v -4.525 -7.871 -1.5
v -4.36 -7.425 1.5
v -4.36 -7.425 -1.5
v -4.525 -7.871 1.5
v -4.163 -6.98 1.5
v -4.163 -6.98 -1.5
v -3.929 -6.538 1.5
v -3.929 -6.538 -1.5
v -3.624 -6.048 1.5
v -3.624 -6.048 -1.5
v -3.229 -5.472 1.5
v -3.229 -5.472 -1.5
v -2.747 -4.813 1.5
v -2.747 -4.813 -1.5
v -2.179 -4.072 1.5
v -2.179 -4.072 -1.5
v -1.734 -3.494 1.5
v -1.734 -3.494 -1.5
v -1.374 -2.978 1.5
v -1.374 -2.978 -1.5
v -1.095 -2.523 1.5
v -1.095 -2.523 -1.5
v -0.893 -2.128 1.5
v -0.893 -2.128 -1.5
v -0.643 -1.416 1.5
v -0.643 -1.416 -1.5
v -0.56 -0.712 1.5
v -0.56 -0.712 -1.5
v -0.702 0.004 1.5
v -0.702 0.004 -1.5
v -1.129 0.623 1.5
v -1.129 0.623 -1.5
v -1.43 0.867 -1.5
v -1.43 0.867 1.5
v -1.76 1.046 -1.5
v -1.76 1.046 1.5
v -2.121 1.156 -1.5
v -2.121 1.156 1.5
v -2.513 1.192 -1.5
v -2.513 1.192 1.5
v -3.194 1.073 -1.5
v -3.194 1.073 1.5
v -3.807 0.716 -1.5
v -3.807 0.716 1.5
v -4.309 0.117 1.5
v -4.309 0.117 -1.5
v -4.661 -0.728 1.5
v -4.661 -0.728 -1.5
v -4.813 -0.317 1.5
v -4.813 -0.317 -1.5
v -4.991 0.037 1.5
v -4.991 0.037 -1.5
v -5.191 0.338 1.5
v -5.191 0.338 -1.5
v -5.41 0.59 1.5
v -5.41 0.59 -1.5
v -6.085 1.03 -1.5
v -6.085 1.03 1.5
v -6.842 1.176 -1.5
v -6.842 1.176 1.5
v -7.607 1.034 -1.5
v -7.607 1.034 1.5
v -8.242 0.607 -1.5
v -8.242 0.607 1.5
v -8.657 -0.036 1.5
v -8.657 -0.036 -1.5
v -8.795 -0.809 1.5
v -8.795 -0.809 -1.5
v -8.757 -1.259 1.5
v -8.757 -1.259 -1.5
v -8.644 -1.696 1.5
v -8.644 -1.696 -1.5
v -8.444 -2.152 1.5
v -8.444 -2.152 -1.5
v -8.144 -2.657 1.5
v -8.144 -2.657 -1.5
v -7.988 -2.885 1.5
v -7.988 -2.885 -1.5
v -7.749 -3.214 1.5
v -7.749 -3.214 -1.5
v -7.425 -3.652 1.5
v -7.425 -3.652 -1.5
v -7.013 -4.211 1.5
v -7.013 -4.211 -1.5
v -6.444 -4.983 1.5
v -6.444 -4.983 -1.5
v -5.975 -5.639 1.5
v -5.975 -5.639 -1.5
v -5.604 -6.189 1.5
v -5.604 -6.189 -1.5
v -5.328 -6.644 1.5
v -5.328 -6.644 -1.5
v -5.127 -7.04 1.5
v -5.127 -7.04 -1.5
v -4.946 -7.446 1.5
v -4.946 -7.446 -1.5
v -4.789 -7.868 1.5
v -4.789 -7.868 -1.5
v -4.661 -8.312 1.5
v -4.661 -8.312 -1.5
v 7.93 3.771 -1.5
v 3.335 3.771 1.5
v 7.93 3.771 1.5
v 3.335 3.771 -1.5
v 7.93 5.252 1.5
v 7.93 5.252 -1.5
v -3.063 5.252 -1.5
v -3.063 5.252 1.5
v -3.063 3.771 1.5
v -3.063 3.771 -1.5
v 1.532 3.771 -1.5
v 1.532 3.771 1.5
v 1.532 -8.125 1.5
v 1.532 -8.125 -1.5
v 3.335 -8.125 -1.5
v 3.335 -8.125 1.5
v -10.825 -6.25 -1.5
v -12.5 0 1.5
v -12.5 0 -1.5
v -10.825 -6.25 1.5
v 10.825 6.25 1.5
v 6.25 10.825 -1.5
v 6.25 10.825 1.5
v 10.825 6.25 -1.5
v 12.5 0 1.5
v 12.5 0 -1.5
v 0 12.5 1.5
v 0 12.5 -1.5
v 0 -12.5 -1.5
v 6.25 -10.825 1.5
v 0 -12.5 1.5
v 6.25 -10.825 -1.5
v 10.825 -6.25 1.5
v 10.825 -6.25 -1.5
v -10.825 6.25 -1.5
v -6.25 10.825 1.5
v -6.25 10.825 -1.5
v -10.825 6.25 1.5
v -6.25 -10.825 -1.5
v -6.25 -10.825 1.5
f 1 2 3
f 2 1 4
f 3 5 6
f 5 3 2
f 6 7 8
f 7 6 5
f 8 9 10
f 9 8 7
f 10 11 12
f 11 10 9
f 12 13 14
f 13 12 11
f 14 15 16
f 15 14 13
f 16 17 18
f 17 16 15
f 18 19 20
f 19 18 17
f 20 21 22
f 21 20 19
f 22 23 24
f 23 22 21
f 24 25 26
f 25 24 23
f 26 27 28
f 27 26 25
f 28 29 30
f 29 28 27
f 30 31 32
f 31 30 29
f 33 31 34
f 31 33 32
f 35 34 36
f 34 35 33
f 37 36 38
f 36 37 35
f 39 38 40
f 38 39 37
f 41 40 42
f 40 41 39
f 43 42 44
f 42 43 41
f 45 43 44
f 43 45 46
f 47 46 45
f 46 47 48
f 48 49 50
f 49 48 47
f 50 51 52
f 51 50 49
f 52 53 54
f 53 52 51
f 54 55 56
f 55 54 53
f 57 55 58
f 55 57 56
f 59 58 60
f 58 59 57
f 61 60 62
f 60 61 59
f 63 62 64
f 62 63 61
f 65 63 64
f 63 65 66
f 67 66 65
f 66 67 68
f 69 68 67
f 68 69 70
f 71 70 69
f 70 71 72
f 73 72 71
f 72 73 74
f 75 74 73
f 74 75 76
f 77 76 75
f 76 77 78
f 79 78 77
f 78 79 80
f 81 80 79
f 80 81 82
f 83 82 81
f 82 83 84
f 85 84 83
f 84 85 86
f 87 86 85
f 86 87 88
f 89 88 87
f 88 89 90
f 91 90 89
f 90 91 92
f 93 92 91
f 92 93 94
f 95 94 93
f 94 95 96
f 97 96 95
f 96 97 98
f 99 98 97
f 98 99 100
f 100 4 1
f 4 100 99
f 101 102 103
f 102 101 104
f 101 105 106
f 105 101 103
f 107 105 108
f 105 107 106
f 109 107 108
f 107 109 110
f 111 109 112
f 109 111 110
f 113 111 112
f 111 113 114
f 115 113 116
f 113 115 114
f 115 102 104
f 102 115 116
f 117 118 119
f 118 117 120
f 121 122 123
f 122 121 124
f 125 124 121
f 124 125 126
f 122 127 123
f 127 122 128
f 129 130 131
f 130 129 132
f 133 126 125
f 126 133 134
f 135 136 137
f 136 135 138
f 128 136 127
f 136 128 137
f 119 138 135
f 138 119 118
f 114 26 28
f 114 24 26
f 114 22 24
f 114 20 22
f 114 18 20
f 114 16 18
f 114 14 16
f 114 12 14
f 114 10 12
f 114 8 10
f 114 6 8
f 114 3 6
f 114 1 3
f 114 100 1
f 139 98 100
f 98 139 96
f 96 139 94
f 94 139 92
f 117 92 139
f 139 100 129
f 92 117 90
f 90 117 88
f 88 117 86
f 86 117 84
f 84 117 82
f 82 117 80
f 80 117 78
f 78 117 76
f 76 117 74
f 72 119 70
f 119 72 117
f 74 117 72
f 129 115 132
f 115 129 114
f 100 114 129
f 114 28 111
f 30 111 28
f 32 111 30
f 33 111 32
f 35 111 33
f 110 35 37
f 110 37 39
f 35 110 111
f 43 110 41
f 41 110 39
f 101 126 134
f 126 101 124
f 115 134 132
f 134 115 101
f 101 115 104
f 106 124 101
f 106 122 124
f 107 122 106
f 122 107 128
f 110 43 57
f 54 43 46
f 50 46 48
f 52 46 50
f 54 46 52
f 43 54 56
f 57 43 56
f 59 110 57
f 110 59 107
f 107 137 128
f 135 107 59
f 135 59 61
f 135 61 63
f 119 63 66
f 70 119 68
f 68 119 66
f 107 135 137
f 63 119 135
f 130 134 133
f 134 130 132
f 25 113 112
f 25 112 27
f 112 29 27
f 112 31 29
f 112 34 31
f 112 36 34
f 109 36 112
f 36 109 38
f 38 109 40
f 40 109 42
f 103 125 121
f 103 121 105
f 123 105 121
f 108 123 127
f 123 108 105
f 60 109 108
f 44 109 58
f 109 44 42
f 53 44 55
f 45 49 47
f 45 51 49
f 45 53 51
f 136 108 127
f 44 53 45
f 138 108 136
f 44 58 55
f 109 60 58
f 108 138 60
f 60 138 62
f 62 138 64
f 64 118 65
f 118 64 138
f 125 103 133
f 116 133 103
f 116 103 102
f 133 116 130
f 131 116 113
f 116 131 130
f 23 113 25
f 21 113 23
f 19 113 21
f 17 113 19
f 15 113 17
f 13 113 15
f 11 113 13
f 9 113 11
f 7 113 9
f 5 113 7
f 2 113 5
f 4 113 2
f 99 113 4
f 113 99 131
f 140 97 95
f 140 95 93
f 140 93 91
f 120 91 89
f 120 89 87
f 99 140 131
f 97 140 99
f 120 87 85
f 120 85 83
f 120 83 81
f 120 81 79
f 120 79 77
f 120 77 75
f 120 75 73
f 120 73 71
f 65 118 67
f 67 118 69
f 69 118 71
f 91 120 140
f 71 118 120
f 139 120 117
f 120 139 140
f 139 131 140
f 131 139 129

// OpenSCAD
$fn=12;

// unit is mm

diameter = 25;
thickness = 3;
slit_width = 0.8;
arrow_base = 7;

diameter_2 = diameter / 2;


difference() {

  union() {
    cylinder(d=diameter, h=thickness, center=true);
  }

  union() {

    translate([ -0.77 * diameter_2, -0.65 * diameter_2, -thickness ])
      linear_extrude(2 * thickness)
      text("\u2665", size=12);
    translate([ -0.28 * diameter_2, -0.65 * diameter_2, -thickness ])
      linear_extrude(2 * thickness)
      text("T", size=14);
  }
}
